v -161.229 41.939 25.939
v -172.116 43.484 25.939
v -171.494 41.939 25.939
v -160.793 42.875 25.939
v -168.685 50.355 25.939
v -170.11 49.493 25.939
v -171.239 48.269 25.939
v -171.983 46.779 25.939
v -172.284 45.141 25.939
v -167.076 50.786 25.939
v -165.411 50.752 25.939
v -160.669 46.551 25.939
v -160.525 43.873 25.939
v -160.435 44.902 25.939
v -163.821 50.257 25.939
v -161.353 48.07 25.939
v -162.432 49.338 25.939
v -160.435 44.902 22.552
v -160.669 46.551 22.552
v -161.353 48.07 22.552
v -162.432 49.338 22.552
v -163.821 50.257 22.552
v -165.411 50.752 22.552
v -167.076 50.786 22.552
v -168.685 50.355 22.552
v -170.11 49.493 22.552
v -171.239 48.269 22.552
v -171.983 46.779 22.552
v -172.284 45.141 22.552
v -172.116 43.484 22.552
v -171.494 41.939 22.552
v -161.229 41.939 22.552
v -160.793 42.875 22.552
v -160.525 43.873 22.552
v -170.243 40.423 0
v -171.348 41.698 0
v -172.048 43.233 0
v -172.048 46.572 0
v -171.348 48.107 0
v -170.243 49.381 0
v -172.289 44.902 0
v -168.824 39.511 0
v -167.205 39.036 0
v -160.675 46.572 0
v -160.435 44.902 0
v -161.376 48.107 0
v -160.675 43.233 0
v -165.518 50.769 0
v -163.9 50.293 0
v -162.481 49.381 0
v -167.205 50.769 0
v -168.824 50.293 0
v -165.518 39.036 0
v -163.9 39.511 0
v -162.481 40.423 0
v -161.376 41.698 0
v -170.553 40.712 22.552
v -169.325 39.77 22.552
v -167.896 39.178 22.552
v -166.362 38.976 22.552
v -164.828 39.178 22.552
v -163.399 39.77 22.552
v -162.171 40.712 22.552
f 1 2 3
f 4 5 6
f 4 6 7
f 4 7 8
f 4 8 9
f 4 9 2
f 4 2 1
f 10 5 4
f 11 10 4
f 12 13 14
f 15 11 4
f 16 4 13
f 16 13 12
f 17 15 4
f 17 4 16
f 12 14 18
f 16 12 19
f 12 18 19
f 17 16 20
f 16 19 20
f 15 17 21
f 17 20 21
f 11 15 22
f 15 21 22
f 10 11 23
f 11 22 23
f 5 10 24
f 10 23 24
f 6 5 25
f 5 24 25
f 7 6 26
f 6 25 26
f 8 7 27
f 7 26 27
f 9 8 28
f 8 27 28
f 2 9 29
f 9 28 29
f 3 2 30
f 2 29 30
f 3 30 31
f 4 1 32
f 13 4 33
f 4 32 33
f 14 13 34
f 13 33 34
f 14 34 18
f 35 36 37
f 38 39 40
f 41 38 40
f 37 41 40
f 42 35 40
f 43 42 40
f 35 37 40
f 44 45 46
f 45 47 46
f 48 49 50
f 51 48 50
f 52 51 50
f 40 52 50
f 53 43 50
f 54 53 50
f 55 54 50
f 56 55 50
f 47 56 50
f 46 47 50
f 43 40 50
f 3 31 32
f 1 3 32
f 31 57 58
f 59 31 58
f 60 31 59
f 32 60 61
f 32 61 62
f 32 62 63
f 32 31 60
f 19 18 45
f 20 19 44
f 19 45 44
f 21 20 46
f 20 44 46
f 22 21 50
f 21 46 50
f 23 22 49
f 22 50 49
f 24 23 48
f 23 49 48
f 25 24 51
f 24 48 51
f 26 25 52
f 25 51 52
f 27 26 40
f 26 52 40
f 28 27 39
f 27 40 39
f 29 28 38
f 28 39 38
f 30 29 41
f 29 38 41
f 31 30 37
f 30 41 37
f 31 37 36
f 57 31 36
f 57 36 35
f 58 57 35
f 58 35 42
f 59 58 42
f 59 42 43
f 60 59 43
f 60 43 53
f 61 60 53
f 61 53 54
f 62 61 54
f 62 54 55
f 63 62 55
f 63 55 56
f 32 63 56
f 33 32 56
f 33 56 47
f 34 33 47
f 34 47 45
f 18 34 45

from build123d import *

# Parameters (mm, degrees)
SKETCH1_R           = 5.926666667
BOSS_EXTRUDE1_DEPTH = 22.552
BOSS_EXTRUDE2_DEPTH = 3.386666667


with BuildPart() as part:
    # Sketch1 → Boss-Extrude1 (new body)
    with BuildSketch(Plane.XY):
        with Locations((-166.361835023, 44.902323519)):
            Circle(SKETCH1_R)
    extrude(amount=BOSS_EXTRUDE1_DEPTH)

    # Sketch2 → Boss-Extrude2 (add)
    with BuildSketch(Plane.XY.offset(22.552)):
        with BuildLine():
            Line((-171.494478916, 41.938990186), (-166.361835023, 41.938990186))
            Line((-166.361835023, 41.938990186), (-161.22919113, 41.938990186))
            ThreePointArc((-161.22919113, 41.938990186), (-160.637114626, 43.368389312), (-160.435168356, 44.902323519))
            ThreePointArc((-160.435168356, 44.902323519), (-167.89576923, 50.627043916), (-171.494478916, 41.938990186))
        make_face()
    extrude(amount=BOSS_EXTRUDE2_DEPTH)


solid = part.part
